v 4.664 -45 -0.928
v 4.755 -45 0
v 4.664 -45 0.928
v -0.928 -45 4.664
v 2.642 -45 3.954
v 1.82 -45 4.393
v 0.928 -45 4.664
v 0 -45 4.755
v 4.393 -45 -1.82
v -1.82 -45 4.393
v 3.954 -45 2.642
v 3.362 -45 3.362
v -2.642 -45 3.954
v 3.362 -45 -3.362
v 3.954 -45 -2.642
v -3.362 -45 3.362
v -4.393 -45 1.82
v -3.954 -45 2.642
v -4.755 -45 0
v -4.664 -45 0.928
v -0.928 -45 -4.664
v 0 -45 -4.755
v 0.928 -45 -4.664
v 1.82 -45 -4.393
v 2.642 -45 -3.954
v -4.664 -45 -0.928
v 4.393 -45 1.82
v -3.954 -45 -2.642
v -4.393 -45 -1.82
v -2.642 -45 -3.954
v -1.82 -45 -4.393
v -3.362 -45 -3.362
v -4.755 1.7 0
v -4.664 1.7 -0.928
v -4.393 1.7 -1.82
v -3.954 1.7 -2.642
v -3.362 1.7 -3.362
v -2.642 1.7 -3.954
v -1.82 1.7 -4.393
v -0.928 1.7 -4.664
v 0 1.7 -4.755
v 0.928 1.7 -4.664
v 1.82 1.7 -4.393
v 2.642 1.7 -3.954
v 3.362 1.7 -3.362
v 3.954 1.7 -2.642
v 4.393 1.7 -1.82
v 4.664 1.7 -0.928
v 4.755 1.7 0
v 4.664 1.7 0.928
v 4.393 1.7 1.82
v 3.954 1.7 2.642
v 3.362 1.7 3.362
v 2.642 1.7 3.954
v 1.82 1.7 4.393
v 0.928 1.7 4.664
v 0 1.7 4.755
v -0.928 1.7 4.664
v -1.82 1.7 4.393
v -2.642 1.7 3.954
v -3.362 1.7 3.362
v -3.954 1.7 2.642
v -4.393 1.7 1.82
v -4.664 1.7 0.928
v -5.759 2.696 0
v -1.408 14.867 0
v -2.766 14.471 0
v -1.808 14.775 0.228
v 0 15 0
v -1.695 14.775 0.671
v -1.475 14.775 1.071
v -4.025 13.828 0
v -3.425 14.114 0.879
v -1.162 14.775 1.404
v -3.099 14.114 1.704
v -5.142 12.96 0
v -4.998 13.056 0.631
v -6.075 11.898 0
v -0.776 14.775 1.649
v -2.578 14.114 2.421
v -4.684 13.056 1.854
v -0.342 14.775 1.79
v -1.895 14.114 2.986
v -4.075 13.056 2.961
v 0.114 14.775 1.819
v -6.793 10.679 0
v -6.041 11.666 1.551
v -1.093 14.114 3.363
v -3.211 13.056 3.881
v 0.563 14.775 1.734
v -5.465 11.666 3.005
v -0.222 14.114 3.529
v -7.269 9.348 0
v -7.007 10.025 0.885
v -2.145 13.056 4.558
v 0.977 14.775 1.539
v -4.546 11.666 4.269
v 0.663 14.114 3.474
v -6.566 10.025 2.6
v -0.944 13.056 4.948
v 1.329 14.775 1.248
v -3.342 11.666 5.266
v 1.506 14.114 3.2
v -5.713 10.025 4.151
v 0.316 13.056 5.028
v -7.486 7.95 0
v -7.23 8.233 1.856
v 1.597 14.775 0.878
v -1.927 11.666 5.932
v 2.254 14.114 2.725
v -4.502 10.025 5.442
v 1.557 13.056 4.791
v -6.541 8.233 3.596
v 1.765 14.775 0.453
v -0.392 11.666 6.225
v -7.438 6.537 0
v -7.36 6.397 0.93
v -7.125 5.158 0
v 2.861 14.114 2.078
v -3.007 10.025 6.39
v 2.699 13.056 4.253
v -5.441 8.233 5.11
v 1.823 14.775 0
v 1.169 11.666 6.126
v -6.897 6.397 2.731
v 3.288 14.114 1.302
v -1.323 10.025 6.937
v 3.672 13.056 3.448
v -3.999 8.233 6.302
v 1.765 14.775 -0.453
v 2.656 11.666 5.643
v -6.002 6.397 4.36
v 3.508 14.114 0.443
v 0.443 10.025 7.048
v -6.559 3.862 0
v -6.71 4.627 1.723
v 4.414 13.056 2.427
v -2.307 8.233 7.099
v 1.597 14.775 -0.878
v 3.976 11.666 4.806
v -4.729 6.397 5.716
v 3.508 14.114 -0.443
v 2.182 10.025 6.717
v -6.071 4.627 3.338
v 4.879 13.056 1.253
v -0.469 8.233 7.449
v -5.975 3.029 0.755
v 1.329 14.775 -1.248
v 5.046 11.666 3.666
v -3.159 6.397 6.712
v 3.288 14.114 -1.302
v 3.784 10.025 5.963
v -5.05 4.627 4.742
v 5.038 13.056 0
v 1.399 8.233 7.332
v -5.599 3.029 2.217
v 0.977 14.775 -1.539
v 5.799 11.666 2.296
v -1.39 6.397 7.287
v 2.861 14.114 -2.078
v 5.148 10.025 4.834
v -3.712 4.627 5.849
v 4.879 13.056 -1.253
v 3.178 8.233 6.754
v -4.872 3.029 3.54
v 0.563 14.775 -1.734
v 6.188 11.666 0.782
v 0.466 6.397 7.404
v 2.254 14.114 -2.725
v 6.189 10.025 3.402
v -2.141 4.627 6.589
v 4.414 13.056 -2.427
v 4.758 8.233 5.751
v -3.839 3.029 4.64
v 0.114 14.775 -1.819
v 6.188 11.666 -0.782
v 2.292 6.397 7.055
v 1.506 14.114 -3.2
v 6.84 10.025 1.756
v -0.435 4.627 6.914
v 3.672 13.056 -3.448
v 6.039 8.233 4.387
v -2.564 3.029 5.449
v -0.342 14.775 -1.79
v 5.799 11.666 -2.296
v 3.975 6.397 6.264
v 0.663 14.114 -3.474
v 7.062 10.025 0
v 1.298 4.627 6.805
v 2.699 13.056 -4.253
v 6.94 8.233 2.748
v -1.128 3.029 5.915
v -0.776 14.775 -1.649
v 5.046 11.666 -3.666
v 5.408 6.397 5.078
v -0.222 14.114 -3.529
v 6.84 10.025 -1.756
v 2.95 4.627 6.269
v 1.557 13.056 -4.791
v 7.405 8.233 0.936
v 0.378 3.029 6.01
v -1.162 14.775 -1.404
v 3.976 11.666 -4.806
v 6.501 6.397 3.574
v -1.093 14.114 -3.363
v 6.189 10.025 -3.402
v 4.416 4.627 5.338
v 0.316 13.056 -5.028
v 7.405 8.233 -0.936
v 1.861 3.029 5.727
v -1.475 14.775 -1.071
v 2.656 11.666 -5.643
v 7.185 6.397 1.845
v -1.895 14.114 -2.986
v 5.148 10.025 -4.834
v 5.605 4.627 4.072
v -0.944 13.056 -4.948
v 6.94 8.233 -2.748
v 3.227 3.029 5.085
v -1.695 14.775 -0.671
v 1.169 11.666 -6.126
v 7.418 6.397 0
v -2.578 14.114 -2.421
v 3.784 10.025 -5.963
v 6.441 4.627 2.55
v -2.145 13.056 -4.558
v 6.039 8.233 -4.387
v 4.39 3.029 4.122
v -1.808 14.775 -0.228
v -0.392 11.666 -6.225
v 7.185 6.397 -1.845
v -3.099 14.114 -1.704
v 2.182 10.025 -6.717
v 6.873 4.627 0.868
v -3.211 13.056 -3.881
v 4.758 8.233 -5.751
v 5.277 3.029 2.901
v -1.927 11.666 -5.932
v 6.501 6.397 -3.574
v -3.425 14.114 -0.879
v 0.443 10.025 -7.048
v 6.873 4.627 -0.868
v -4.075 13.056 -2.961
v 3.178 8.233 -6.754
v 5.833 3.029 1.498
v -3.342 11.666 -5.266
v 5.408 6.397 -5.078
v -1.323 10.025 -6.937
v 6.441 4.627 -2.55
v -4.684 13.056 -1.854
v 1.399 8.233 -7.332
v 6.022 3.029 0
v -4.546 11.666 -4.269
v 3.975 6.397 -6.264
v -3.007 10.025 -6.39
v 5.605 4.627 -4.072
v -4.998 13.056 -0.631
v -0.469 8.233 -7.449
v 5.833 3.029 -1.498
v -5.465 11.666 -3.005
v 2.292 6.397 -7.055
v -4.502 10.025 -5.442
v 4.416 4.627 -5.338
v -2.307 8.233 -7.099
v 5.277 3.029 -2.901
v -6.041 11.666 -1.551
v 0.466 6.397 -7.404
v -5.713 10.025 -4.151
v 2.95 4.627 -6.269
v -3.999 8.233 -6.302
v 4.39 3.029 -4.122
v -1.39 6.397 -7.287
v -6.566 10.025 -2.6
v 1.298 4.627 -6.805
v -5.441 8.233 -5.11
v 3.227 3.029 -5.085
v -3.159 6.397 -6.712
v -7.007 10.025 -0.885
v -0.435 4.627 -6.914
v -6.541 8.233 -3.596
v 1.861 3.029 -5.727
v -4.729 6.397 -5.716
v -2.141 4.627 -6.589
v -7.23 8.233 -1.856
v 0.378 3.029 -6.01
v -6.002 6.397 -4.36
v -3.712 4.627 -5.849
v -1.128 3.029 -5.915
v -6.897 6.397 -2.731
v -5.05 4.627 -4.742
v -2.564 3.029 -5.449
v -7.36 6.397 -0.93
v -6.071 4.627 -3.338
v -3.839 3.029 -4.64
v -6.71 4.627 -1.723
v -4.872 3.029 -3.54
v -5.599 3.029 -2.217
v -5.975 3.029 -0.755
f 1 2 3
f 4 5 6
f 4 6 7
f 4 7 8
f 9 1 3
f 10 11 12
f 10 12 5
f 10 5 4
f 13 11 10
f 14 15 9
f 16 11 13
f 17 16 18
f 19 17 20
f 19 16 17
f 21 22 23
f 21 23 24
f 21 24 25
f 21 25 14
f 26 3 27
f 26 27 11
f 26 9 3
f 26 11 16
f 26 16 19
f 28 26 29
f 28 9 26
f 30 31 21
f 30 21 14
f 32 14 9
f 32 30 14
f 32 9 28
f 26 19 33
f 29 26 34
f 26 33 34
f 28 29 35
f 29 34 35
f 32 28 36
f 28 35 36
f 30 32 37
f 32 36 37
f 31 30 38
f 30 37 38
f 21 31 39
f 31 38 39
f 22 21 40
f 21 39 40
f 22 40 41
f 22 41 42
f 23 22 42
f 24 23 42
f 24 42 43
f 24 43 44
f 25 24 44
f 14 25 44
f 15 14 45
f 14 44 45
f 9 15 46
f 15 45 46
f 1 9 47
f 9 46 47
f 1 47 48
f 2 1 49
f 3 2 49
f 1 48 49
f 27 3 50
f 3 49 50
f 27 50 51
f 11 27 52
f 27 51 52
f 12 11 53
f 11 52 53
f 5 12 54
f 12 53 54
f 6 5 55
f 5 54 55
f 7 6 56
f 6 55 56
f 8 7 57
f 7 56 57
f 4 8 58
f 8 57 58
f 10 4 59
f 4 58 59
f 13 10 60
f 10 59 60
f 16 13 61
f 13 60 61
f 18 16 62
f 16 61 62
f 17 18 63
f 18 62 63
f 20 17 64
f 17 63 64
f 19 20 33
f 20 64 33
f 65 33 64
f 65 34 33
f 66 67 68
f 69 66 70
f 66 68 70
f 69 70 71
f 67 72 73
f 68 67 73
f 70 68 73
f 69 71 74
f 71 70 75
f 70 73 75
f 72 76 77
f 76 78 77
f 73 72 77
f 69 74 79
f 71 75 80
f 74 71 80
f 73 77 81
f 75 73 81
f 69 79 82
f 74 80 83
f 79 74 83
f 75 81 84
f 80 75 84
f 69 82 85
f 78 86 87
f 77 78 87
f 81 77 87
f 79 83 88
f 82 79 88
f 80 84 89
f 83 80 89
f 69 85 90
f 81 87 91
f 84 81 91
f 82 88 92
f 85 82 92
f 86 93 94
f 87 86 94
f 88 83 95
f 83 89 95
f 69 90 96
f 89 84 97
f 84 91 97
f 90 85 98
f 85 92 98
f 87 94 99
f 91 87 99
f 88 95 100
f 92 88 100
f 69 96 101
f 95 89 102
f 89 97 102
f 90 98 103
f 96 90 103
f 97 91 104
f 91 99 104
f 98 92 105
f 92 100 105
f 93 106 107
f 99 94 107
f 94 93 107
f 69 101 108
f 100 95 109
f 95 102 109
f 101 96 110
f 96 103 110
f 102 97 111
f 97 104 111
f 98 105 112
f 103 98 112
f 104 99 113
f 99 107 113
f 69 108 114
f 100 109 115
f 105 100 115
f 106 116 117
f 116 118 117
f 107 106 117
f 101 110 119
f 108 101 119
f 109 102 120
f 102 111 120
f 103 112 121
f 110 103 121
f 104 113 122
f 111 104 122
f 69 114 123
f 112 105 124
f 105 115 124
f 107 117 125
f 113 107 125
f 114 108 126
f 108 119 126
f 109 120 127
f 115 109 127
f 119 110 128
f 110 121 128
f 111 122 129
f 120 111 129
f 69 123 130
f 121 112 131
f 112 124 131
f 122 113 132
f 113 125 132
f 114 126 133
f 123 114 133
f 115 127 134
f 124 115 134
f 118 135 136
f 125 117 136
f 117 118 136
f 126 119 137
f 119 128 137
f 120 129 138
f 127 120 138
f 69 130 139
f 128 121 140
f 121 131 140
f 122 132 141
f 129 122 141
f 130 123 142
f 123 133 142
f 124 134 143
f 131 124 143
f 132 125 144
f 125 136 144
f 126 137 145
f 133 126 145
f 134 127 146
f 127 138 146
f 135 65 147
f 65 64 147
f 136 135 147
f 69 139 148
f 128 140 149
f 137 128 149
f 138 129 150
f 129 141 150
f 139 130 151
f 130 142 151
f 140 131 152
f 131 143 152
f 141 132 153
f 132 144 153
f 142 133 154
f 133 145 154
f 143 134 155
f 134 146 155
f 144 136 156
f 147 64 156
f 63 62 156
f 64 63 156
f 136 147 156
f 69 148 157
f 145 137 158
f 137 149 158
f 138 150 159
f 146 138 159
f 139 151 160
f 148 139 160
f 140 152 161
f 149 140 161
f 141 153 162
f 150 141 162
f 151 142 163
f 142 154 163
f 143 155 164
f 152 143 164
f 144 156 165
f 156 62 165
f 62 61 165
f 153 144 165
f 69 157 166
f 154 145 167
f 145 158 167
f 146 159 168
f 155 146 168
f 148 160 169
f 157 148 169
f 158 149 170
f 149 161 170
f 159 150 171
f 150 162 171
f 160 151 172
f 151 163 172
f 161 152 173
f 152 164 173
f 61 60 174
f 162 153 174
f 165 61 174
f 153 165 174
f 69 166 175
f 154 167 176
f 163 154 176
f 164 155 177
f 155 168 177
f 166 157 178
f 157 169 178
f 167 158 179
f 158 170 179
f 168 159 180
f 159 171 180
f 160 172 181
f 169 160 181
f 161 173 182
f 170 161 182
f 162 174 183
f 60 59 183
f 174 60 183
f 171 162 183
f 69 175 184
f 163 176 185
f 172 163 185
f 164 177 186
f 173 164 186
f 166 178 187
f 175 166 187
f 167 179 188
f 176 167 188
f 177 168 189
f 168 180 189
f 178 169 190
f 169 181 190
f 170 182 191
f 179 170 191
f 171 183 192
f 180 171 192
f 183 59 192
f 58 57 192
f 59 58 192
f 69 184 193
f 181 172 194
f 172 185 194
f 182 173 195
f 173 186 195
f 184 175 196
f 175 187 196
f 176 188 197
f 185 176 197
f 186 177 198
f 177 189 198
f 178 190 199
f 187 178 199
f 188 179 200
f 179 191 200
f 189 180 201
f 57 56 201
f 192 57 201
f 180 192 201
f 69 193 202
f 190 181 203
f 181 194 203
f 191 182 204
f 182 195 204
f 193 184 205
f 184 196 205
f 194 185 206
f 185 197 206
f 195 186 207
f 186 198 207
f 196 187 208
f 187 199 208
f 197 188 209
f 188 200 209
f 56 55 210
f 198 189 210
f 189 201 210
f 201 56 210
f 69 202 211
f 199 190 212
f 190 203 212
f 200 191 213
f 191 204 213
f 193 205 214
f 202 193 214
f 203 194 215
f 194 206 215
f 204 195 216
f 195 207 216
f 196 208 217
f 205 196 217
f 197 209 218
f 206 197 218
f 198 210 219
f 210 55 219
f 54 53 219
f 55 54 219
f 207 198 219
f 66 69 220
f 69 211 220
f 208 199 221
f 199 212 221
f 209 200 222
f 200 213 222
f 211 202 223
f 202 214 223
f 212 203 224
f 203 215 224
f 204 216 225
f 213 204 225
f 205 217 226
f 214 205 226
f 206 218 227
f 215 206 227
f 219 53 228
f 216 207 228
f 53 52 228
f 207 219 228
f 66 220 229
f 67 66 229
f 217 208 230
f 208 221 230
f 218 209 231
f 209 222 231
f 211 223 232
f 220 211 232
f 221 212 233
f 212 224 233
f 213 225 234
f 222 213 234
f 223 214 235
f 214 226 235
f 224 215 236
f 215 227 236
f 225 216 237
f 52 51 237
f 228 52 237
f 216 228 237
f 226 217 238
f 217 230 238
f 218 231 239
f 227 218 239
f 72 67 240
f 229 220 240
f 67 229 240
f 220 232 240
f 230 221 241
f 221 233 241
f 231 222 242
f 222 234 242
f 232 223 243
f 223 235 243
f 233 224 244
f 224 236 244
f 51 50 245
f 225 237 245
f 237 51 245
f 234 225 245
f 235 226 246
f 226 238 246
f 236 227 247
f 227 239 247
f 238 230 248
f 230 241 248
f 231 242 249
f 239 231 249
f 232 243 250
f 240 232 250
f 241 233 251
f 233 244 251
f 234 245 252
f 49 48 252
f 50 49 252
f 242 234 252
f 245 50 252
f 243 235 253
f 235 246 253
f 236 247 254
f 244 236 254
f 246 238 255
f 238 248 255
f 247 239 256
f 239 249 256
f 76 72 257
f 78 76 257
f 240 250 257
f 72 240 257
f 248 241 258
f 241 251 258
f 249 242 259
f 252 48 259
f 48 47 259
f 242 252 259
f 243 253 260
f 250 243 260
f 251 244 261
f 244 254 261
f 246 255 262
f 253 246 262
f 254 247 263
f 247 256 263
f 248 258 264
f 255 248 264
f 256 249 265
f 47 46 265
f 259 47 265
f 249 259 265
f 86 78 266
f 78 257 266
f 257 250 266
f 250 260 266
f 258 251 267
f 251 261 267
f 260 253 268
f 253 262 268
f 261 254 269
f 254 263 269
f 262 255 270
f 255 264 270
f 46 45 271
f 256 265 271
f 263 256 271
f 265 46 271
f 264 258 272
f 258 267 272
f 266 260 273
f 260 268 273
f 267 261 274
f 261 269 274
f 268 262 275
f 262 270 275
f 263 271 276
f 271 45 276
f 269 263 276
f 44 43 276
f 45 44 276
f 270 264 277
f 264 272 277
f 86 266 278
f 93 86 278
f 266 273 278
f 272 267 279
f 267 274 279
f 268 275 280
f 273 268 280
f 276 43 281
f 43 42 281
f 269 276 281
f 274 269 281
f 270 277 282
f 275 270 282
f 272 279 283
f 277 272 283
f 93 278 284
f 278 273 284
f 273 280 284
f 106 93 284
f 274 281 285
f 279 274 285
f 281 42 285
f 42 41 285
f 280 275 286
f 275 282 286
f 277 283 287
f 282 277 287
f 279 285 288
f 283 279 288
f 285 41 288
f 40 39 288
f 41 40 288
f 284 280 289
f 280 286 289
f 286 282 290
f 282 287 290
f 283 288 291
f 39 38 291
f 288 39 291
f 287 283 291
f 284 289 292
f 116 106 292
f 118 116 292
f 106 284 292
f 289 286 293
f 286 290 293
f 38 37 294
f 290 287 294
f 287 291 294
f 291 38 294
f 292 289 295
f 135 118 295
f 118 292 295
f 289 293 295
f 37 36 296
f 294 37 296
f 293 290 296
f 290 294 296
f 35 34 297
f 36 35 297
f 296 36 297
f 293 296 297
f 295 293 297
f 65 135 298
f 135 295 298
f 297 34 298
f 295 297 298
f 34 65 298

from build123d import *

# Parameters (mm, degrees)
SKETCH2_R           = 4.755
BOSS_EXTRUDE1_DEPTH = 3
SKETCH3_R           = 4.755
BOSS_EXTRUDE2_DEPTH = 45


with BuildPart() as part:
    # Sketch1 → Revolve1 (revolve)
    with BuildSketch(Plane.XY):
        with BuildLine():
            Line((0, 0), (0, 15))
            ThreePointArc((0, 15), (-7.5, 7.5), (0, 0))
        make_face()
    revolve(axis=Axis((0, 0, 0), (0, 1, 0)))

    # Sketch2 → Boss-Extrude1 (add)
    with BuildSketch(Plane(origin=(0, 0, 0), x_dir=(-1, 0, 0), z_dir=(0, -1, 0))):
        Circle(SKETCH2_R)
    extrude(amount=-BOSS_EXTRUDE1_DEPTH)

    # Sketch3 → Boss-Extrude2 (add)
    with BuildSketch(Plane(origin=(0, 0, 0), x_dir=(-1, 0, 0), z_dir=(0, -1, 0))):
        Circle(SKETCH3_R)
    extrude(amount=BOSS_EXTRUDE2_DEPTH)


solid = part.part
